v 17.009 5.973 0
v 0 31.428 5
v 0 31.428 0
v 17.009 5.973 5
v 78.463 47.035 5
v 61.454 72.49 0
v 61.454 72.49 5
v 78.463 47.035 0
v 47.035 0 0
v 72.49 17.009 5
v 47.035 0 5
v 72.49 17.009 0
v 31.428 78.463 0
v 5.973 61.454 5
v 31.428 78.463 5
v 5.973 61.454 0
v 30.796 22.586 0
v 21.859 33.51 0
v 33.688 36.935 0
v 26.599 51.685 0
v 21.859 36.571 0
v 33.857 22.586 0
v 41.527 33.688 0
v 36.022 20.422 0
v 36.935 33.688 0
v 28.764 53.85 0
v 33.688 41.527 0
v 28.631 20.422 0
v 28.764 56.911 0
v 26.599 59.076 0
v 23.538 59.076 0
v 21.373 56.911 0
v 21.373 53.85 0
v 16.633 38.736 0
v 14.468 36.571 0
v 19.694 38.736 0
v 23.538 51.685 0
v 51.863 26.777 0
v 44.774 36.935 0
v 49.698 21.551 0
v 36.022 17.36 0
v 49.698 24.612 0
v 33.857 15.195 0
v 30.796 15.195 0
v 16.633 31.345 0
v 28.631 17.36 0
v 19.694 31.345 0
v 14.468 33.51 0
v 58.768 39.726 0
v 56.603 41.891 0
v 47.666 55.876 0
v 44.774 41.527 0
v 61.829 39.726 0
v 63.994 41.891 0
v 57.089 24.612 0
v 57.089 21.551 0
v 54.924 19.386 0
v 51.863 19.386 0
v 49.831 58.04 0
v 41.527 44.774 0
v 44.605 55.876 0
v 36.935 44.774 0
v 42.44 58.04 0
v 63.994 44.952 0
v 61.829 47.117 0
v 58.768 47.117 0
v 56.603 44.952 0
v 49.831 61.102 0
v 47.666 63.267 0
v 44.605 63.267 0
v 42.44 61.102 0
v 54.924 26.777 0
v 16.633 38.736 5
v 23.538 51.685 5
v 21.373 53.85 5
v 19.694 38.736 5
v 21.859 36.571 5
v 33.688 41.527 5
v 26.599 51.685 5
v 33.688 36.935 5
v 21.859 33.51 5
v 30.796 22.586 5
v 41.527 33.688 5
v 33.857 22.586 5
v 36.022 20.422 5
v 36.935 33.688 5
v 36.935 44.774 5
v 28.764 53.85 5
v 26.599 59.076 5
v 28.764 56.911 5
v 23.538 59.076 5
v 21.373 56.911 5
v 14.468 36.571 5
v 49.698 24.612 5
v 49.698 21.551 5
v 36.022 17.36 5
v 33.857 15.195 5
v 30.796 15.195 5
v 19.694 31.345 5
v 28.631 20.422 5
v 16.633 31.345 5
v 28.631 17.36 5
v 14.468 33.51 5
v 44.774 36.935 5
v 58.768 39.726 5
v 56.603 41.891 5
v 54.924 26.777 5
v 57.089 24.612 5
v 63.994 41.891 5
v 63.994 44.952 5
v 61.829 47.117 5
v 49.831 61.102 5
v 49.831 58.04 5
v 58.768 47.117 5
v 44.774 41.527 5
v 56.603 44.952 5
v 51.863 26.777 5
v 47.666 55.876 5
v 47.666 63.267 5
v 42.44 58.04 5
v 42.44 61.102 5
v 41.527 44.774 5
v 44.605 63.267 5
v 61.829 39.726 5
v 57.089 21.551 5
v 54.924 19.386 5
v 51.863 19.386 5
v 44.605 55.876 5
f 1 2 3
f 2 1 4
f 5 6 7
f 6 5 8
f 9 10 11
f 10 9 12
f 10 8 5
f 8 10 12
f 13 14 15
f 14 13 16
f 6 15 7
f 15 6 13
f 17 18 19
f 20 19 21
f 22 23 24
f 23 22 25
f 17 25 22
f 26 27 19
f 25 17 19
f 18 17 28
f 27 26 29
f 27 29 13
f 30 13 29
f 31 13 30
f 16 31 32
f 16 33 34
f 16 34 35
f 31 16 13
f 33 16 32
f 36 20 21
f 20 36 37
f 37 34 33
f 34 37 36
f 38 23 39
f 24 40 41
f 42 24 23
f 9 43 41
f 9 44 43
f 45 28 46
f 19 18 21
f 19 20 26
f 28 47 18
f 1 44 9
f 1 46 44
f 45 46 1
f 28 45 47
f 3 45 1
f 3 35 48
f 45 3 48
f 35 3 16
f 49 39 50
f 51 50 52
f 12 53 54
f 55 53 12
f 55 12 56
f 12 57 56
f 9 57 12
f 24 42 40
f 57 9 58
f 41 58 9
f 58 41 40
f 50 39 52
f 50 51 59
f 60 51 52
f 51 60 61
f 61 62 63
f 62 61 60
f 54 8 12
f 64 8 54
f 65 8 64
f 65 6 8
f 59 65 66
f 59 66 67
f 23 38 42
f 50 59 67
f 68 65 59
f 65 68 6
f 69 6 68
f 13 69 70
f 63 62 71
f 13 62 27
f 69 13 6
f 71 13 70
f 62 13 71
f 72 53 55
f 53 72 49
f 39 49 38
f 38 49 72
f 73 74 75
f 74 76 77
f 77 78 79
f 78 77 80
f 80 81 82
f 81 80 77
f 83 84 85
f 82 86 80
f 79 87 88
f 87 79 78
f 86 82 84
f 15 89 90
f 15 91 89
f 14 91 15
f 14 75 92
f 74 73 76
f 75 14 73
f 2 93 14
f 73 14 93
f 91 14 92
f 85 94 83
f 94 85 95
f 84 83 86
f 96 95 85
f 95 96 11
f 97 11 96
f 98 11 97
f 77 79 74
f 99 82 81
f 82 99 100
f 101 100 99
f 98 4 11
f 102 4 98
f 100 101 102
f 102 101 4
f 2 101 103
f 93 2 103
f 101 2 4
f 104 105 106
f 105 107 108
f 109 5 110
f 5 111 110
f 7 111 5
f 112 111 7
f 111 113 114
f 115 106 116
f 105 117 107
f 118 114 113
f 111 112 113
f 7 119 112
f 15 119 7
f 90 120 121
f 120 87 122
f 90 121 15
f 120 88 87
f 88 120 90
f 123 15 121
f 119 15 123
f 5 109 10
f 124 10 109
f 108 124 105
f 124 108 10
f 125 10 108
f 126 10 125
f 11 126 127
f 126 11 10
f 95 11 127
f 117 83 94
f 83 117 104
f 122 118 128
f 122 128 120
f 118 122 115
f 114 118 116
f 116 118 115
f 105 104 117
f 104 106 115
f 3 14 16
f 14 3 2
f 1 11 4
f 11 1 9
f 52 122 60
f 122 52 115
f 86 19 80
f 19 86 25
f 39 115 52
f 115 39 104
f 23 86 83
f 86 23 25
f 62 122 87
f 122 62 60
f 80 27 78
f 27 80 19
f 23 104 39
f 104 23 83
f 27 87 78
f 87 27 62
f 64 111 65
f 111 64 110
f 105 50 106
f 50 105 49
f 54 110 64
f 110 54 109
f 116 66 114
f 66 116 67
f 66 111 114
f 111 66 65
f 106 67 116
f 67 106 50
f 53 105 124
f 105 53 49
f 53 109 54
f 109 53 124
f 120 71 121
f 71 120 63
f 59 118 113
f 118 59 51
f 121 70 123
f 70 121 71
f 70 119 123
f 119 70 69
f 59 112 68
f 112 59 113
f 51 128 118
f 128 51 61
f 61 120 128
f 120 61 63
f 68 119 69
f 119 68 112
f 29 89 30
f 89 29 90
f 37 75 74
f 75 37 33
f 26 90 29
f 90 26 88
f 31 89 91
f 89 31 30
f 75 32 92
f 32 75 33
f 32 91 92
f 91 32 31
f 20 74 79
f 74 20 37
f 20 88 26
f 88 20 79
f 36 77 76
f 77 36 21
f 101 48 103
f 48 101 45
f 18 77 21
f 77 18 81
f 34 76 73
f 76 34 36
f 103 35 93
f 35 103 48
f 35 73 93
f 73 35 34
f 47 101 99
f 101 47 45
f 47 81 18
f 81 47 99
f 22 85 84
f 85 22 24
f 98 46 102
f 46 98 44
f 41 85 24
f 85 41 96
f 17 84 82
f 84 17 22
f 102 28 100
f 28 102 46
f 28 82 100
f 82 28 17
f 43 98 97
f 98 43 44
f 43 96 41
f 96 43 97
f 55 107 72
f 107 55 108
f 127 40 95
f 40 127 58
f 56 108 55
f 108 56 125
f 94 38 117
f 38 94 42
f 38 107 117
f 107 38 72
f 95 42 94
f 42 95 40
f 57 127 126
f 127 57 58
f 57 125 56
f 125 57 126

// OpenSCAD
$fn = 32;

// ----------------------------------------------------------------------
// Polygon plate: 8-gon R40, 6 bolt windows
// ----------------------------------------------------------------------

// --- parameters (mm) ---
sides = 8;                // number of polygon sides
plate_r = 40;             // circumscribed radius of the polygon
bore_r = 6;               // centre bore radius
bolts = 6;                // number of bolt windows
ring_r = 21.48;           // bolt-circle radius
bolt_r = 4;               // bolt window radius
plate_t = 5;              // plate thickness, Z (extrusion height)
fit_tol = 0.05;           // declared fit tolerance (prompt contract)
free_tol = 0.2;           // declared free tolerance (prompt contract)

plate_d = 2 * plate_r;  // circumscribed diameter
bore_d = 2 * bore_r;  // centre bore diameter
bolt_d = 2 * bolt_r;  // bolt window diameter
ring_d = 2 * ring_r;  // bolt-circle diameter

profile = [[78.463, 47.035], [61.454, 72.49], [31.428, 78.463], [5.973, 61.454], [0, 31.428], [17.009, 5.973], [47.035, 0], [72.49, 17.009]];  // primary outline, 8 points, counter clockwise
void_1 = [[44.774, 41.527], [41.527, 44.774], [36.935, 44.774], [33.688, 41.527], [33.688, 36.935], [36.935, 33.688], [41.527, 33.688], [44.774, 36.935]];  // centre bore, 8 points
void_2 = [[63.994, 44.952], [61.829, 47.117], [58.768, 47.117], [56.603, 44.952], [56.603, 41.891], [58.768, 39.726], [61.829, 39.726], [63.994, 41.891]];  // bolt window 1, 8 points
void_3 = [[49.831, 61.102], [47.666, 63.267], [44.605, 63.267], [42.44, 61.102], [42.44, 58.04], [44.605, 55.876], [47.666, 55.876], [49.831, 58.04]];  // bolt window 2, 8 points
void_4 = [[28.764, 56.911], [26.599, 59.076], [23.538, 59.076], [21.373, 56.911], [21.373, 53.85], [23.538, 51.685], [26.599, 51.685], [28.764, 53.85]];  // bolt window 3, 8 points
void_5 = [[21.859, 36.571], [19.694, 38.736], [16.633, 38.736], [14.468, 36.571], [14.468, 33.51], [16.633, 31.345], [19.694, 31.345], [21.859, 33.51]];  // bolt window 4, 8 points
void_6 = [[36.022, 20.422], [33.857, 22.586], [30.796, 22.586], [28.631, 20.422], [28.631, 17.36], [30.796, 15.195], [33.857, 15.195], [36.022, 17.36]];  // bolt window 5, 8 points
void_7 = [[57.089, 24.612], [54.924, 26.777], [51.863, 26.777], [49.698, 24.612], [49.698, 21.551], [51.863, 19.386], [54.924, 19.386], [57.089, 21.551]];  // bolt window 6, 8 points

// --- the one profile operation ---
difference() {
  linear_extrude(height = plate_t) polygon(points = profile);
  translate([0, 0, -1])
    linear_extrude(height = plate_t + 2) polygon(points = void_1);
  translate([0, 0, -1])
    linear_extrude(height = plate_t + 2) polygon(points = void_2);
  translate([0, 0, -1])
    linear_extrude(height = plate_t + 2) polygon(points = void_3);
  translate([0, 0, -1])
    linear_extrude(height = plate_t + 2) polygon(points = void_4);
  translate([0, 0, -1])
    linear_extrude(height = plate_t + 2) polygon(points = void_5);
  translate([0, 0, -1])
    linear_extrude(height = plate_t + 2) polygon(points = void_6);
  translate([0, 0, -1])
    linear_extrude(height = plate_t + 2) polygon(points = void_7);
}
